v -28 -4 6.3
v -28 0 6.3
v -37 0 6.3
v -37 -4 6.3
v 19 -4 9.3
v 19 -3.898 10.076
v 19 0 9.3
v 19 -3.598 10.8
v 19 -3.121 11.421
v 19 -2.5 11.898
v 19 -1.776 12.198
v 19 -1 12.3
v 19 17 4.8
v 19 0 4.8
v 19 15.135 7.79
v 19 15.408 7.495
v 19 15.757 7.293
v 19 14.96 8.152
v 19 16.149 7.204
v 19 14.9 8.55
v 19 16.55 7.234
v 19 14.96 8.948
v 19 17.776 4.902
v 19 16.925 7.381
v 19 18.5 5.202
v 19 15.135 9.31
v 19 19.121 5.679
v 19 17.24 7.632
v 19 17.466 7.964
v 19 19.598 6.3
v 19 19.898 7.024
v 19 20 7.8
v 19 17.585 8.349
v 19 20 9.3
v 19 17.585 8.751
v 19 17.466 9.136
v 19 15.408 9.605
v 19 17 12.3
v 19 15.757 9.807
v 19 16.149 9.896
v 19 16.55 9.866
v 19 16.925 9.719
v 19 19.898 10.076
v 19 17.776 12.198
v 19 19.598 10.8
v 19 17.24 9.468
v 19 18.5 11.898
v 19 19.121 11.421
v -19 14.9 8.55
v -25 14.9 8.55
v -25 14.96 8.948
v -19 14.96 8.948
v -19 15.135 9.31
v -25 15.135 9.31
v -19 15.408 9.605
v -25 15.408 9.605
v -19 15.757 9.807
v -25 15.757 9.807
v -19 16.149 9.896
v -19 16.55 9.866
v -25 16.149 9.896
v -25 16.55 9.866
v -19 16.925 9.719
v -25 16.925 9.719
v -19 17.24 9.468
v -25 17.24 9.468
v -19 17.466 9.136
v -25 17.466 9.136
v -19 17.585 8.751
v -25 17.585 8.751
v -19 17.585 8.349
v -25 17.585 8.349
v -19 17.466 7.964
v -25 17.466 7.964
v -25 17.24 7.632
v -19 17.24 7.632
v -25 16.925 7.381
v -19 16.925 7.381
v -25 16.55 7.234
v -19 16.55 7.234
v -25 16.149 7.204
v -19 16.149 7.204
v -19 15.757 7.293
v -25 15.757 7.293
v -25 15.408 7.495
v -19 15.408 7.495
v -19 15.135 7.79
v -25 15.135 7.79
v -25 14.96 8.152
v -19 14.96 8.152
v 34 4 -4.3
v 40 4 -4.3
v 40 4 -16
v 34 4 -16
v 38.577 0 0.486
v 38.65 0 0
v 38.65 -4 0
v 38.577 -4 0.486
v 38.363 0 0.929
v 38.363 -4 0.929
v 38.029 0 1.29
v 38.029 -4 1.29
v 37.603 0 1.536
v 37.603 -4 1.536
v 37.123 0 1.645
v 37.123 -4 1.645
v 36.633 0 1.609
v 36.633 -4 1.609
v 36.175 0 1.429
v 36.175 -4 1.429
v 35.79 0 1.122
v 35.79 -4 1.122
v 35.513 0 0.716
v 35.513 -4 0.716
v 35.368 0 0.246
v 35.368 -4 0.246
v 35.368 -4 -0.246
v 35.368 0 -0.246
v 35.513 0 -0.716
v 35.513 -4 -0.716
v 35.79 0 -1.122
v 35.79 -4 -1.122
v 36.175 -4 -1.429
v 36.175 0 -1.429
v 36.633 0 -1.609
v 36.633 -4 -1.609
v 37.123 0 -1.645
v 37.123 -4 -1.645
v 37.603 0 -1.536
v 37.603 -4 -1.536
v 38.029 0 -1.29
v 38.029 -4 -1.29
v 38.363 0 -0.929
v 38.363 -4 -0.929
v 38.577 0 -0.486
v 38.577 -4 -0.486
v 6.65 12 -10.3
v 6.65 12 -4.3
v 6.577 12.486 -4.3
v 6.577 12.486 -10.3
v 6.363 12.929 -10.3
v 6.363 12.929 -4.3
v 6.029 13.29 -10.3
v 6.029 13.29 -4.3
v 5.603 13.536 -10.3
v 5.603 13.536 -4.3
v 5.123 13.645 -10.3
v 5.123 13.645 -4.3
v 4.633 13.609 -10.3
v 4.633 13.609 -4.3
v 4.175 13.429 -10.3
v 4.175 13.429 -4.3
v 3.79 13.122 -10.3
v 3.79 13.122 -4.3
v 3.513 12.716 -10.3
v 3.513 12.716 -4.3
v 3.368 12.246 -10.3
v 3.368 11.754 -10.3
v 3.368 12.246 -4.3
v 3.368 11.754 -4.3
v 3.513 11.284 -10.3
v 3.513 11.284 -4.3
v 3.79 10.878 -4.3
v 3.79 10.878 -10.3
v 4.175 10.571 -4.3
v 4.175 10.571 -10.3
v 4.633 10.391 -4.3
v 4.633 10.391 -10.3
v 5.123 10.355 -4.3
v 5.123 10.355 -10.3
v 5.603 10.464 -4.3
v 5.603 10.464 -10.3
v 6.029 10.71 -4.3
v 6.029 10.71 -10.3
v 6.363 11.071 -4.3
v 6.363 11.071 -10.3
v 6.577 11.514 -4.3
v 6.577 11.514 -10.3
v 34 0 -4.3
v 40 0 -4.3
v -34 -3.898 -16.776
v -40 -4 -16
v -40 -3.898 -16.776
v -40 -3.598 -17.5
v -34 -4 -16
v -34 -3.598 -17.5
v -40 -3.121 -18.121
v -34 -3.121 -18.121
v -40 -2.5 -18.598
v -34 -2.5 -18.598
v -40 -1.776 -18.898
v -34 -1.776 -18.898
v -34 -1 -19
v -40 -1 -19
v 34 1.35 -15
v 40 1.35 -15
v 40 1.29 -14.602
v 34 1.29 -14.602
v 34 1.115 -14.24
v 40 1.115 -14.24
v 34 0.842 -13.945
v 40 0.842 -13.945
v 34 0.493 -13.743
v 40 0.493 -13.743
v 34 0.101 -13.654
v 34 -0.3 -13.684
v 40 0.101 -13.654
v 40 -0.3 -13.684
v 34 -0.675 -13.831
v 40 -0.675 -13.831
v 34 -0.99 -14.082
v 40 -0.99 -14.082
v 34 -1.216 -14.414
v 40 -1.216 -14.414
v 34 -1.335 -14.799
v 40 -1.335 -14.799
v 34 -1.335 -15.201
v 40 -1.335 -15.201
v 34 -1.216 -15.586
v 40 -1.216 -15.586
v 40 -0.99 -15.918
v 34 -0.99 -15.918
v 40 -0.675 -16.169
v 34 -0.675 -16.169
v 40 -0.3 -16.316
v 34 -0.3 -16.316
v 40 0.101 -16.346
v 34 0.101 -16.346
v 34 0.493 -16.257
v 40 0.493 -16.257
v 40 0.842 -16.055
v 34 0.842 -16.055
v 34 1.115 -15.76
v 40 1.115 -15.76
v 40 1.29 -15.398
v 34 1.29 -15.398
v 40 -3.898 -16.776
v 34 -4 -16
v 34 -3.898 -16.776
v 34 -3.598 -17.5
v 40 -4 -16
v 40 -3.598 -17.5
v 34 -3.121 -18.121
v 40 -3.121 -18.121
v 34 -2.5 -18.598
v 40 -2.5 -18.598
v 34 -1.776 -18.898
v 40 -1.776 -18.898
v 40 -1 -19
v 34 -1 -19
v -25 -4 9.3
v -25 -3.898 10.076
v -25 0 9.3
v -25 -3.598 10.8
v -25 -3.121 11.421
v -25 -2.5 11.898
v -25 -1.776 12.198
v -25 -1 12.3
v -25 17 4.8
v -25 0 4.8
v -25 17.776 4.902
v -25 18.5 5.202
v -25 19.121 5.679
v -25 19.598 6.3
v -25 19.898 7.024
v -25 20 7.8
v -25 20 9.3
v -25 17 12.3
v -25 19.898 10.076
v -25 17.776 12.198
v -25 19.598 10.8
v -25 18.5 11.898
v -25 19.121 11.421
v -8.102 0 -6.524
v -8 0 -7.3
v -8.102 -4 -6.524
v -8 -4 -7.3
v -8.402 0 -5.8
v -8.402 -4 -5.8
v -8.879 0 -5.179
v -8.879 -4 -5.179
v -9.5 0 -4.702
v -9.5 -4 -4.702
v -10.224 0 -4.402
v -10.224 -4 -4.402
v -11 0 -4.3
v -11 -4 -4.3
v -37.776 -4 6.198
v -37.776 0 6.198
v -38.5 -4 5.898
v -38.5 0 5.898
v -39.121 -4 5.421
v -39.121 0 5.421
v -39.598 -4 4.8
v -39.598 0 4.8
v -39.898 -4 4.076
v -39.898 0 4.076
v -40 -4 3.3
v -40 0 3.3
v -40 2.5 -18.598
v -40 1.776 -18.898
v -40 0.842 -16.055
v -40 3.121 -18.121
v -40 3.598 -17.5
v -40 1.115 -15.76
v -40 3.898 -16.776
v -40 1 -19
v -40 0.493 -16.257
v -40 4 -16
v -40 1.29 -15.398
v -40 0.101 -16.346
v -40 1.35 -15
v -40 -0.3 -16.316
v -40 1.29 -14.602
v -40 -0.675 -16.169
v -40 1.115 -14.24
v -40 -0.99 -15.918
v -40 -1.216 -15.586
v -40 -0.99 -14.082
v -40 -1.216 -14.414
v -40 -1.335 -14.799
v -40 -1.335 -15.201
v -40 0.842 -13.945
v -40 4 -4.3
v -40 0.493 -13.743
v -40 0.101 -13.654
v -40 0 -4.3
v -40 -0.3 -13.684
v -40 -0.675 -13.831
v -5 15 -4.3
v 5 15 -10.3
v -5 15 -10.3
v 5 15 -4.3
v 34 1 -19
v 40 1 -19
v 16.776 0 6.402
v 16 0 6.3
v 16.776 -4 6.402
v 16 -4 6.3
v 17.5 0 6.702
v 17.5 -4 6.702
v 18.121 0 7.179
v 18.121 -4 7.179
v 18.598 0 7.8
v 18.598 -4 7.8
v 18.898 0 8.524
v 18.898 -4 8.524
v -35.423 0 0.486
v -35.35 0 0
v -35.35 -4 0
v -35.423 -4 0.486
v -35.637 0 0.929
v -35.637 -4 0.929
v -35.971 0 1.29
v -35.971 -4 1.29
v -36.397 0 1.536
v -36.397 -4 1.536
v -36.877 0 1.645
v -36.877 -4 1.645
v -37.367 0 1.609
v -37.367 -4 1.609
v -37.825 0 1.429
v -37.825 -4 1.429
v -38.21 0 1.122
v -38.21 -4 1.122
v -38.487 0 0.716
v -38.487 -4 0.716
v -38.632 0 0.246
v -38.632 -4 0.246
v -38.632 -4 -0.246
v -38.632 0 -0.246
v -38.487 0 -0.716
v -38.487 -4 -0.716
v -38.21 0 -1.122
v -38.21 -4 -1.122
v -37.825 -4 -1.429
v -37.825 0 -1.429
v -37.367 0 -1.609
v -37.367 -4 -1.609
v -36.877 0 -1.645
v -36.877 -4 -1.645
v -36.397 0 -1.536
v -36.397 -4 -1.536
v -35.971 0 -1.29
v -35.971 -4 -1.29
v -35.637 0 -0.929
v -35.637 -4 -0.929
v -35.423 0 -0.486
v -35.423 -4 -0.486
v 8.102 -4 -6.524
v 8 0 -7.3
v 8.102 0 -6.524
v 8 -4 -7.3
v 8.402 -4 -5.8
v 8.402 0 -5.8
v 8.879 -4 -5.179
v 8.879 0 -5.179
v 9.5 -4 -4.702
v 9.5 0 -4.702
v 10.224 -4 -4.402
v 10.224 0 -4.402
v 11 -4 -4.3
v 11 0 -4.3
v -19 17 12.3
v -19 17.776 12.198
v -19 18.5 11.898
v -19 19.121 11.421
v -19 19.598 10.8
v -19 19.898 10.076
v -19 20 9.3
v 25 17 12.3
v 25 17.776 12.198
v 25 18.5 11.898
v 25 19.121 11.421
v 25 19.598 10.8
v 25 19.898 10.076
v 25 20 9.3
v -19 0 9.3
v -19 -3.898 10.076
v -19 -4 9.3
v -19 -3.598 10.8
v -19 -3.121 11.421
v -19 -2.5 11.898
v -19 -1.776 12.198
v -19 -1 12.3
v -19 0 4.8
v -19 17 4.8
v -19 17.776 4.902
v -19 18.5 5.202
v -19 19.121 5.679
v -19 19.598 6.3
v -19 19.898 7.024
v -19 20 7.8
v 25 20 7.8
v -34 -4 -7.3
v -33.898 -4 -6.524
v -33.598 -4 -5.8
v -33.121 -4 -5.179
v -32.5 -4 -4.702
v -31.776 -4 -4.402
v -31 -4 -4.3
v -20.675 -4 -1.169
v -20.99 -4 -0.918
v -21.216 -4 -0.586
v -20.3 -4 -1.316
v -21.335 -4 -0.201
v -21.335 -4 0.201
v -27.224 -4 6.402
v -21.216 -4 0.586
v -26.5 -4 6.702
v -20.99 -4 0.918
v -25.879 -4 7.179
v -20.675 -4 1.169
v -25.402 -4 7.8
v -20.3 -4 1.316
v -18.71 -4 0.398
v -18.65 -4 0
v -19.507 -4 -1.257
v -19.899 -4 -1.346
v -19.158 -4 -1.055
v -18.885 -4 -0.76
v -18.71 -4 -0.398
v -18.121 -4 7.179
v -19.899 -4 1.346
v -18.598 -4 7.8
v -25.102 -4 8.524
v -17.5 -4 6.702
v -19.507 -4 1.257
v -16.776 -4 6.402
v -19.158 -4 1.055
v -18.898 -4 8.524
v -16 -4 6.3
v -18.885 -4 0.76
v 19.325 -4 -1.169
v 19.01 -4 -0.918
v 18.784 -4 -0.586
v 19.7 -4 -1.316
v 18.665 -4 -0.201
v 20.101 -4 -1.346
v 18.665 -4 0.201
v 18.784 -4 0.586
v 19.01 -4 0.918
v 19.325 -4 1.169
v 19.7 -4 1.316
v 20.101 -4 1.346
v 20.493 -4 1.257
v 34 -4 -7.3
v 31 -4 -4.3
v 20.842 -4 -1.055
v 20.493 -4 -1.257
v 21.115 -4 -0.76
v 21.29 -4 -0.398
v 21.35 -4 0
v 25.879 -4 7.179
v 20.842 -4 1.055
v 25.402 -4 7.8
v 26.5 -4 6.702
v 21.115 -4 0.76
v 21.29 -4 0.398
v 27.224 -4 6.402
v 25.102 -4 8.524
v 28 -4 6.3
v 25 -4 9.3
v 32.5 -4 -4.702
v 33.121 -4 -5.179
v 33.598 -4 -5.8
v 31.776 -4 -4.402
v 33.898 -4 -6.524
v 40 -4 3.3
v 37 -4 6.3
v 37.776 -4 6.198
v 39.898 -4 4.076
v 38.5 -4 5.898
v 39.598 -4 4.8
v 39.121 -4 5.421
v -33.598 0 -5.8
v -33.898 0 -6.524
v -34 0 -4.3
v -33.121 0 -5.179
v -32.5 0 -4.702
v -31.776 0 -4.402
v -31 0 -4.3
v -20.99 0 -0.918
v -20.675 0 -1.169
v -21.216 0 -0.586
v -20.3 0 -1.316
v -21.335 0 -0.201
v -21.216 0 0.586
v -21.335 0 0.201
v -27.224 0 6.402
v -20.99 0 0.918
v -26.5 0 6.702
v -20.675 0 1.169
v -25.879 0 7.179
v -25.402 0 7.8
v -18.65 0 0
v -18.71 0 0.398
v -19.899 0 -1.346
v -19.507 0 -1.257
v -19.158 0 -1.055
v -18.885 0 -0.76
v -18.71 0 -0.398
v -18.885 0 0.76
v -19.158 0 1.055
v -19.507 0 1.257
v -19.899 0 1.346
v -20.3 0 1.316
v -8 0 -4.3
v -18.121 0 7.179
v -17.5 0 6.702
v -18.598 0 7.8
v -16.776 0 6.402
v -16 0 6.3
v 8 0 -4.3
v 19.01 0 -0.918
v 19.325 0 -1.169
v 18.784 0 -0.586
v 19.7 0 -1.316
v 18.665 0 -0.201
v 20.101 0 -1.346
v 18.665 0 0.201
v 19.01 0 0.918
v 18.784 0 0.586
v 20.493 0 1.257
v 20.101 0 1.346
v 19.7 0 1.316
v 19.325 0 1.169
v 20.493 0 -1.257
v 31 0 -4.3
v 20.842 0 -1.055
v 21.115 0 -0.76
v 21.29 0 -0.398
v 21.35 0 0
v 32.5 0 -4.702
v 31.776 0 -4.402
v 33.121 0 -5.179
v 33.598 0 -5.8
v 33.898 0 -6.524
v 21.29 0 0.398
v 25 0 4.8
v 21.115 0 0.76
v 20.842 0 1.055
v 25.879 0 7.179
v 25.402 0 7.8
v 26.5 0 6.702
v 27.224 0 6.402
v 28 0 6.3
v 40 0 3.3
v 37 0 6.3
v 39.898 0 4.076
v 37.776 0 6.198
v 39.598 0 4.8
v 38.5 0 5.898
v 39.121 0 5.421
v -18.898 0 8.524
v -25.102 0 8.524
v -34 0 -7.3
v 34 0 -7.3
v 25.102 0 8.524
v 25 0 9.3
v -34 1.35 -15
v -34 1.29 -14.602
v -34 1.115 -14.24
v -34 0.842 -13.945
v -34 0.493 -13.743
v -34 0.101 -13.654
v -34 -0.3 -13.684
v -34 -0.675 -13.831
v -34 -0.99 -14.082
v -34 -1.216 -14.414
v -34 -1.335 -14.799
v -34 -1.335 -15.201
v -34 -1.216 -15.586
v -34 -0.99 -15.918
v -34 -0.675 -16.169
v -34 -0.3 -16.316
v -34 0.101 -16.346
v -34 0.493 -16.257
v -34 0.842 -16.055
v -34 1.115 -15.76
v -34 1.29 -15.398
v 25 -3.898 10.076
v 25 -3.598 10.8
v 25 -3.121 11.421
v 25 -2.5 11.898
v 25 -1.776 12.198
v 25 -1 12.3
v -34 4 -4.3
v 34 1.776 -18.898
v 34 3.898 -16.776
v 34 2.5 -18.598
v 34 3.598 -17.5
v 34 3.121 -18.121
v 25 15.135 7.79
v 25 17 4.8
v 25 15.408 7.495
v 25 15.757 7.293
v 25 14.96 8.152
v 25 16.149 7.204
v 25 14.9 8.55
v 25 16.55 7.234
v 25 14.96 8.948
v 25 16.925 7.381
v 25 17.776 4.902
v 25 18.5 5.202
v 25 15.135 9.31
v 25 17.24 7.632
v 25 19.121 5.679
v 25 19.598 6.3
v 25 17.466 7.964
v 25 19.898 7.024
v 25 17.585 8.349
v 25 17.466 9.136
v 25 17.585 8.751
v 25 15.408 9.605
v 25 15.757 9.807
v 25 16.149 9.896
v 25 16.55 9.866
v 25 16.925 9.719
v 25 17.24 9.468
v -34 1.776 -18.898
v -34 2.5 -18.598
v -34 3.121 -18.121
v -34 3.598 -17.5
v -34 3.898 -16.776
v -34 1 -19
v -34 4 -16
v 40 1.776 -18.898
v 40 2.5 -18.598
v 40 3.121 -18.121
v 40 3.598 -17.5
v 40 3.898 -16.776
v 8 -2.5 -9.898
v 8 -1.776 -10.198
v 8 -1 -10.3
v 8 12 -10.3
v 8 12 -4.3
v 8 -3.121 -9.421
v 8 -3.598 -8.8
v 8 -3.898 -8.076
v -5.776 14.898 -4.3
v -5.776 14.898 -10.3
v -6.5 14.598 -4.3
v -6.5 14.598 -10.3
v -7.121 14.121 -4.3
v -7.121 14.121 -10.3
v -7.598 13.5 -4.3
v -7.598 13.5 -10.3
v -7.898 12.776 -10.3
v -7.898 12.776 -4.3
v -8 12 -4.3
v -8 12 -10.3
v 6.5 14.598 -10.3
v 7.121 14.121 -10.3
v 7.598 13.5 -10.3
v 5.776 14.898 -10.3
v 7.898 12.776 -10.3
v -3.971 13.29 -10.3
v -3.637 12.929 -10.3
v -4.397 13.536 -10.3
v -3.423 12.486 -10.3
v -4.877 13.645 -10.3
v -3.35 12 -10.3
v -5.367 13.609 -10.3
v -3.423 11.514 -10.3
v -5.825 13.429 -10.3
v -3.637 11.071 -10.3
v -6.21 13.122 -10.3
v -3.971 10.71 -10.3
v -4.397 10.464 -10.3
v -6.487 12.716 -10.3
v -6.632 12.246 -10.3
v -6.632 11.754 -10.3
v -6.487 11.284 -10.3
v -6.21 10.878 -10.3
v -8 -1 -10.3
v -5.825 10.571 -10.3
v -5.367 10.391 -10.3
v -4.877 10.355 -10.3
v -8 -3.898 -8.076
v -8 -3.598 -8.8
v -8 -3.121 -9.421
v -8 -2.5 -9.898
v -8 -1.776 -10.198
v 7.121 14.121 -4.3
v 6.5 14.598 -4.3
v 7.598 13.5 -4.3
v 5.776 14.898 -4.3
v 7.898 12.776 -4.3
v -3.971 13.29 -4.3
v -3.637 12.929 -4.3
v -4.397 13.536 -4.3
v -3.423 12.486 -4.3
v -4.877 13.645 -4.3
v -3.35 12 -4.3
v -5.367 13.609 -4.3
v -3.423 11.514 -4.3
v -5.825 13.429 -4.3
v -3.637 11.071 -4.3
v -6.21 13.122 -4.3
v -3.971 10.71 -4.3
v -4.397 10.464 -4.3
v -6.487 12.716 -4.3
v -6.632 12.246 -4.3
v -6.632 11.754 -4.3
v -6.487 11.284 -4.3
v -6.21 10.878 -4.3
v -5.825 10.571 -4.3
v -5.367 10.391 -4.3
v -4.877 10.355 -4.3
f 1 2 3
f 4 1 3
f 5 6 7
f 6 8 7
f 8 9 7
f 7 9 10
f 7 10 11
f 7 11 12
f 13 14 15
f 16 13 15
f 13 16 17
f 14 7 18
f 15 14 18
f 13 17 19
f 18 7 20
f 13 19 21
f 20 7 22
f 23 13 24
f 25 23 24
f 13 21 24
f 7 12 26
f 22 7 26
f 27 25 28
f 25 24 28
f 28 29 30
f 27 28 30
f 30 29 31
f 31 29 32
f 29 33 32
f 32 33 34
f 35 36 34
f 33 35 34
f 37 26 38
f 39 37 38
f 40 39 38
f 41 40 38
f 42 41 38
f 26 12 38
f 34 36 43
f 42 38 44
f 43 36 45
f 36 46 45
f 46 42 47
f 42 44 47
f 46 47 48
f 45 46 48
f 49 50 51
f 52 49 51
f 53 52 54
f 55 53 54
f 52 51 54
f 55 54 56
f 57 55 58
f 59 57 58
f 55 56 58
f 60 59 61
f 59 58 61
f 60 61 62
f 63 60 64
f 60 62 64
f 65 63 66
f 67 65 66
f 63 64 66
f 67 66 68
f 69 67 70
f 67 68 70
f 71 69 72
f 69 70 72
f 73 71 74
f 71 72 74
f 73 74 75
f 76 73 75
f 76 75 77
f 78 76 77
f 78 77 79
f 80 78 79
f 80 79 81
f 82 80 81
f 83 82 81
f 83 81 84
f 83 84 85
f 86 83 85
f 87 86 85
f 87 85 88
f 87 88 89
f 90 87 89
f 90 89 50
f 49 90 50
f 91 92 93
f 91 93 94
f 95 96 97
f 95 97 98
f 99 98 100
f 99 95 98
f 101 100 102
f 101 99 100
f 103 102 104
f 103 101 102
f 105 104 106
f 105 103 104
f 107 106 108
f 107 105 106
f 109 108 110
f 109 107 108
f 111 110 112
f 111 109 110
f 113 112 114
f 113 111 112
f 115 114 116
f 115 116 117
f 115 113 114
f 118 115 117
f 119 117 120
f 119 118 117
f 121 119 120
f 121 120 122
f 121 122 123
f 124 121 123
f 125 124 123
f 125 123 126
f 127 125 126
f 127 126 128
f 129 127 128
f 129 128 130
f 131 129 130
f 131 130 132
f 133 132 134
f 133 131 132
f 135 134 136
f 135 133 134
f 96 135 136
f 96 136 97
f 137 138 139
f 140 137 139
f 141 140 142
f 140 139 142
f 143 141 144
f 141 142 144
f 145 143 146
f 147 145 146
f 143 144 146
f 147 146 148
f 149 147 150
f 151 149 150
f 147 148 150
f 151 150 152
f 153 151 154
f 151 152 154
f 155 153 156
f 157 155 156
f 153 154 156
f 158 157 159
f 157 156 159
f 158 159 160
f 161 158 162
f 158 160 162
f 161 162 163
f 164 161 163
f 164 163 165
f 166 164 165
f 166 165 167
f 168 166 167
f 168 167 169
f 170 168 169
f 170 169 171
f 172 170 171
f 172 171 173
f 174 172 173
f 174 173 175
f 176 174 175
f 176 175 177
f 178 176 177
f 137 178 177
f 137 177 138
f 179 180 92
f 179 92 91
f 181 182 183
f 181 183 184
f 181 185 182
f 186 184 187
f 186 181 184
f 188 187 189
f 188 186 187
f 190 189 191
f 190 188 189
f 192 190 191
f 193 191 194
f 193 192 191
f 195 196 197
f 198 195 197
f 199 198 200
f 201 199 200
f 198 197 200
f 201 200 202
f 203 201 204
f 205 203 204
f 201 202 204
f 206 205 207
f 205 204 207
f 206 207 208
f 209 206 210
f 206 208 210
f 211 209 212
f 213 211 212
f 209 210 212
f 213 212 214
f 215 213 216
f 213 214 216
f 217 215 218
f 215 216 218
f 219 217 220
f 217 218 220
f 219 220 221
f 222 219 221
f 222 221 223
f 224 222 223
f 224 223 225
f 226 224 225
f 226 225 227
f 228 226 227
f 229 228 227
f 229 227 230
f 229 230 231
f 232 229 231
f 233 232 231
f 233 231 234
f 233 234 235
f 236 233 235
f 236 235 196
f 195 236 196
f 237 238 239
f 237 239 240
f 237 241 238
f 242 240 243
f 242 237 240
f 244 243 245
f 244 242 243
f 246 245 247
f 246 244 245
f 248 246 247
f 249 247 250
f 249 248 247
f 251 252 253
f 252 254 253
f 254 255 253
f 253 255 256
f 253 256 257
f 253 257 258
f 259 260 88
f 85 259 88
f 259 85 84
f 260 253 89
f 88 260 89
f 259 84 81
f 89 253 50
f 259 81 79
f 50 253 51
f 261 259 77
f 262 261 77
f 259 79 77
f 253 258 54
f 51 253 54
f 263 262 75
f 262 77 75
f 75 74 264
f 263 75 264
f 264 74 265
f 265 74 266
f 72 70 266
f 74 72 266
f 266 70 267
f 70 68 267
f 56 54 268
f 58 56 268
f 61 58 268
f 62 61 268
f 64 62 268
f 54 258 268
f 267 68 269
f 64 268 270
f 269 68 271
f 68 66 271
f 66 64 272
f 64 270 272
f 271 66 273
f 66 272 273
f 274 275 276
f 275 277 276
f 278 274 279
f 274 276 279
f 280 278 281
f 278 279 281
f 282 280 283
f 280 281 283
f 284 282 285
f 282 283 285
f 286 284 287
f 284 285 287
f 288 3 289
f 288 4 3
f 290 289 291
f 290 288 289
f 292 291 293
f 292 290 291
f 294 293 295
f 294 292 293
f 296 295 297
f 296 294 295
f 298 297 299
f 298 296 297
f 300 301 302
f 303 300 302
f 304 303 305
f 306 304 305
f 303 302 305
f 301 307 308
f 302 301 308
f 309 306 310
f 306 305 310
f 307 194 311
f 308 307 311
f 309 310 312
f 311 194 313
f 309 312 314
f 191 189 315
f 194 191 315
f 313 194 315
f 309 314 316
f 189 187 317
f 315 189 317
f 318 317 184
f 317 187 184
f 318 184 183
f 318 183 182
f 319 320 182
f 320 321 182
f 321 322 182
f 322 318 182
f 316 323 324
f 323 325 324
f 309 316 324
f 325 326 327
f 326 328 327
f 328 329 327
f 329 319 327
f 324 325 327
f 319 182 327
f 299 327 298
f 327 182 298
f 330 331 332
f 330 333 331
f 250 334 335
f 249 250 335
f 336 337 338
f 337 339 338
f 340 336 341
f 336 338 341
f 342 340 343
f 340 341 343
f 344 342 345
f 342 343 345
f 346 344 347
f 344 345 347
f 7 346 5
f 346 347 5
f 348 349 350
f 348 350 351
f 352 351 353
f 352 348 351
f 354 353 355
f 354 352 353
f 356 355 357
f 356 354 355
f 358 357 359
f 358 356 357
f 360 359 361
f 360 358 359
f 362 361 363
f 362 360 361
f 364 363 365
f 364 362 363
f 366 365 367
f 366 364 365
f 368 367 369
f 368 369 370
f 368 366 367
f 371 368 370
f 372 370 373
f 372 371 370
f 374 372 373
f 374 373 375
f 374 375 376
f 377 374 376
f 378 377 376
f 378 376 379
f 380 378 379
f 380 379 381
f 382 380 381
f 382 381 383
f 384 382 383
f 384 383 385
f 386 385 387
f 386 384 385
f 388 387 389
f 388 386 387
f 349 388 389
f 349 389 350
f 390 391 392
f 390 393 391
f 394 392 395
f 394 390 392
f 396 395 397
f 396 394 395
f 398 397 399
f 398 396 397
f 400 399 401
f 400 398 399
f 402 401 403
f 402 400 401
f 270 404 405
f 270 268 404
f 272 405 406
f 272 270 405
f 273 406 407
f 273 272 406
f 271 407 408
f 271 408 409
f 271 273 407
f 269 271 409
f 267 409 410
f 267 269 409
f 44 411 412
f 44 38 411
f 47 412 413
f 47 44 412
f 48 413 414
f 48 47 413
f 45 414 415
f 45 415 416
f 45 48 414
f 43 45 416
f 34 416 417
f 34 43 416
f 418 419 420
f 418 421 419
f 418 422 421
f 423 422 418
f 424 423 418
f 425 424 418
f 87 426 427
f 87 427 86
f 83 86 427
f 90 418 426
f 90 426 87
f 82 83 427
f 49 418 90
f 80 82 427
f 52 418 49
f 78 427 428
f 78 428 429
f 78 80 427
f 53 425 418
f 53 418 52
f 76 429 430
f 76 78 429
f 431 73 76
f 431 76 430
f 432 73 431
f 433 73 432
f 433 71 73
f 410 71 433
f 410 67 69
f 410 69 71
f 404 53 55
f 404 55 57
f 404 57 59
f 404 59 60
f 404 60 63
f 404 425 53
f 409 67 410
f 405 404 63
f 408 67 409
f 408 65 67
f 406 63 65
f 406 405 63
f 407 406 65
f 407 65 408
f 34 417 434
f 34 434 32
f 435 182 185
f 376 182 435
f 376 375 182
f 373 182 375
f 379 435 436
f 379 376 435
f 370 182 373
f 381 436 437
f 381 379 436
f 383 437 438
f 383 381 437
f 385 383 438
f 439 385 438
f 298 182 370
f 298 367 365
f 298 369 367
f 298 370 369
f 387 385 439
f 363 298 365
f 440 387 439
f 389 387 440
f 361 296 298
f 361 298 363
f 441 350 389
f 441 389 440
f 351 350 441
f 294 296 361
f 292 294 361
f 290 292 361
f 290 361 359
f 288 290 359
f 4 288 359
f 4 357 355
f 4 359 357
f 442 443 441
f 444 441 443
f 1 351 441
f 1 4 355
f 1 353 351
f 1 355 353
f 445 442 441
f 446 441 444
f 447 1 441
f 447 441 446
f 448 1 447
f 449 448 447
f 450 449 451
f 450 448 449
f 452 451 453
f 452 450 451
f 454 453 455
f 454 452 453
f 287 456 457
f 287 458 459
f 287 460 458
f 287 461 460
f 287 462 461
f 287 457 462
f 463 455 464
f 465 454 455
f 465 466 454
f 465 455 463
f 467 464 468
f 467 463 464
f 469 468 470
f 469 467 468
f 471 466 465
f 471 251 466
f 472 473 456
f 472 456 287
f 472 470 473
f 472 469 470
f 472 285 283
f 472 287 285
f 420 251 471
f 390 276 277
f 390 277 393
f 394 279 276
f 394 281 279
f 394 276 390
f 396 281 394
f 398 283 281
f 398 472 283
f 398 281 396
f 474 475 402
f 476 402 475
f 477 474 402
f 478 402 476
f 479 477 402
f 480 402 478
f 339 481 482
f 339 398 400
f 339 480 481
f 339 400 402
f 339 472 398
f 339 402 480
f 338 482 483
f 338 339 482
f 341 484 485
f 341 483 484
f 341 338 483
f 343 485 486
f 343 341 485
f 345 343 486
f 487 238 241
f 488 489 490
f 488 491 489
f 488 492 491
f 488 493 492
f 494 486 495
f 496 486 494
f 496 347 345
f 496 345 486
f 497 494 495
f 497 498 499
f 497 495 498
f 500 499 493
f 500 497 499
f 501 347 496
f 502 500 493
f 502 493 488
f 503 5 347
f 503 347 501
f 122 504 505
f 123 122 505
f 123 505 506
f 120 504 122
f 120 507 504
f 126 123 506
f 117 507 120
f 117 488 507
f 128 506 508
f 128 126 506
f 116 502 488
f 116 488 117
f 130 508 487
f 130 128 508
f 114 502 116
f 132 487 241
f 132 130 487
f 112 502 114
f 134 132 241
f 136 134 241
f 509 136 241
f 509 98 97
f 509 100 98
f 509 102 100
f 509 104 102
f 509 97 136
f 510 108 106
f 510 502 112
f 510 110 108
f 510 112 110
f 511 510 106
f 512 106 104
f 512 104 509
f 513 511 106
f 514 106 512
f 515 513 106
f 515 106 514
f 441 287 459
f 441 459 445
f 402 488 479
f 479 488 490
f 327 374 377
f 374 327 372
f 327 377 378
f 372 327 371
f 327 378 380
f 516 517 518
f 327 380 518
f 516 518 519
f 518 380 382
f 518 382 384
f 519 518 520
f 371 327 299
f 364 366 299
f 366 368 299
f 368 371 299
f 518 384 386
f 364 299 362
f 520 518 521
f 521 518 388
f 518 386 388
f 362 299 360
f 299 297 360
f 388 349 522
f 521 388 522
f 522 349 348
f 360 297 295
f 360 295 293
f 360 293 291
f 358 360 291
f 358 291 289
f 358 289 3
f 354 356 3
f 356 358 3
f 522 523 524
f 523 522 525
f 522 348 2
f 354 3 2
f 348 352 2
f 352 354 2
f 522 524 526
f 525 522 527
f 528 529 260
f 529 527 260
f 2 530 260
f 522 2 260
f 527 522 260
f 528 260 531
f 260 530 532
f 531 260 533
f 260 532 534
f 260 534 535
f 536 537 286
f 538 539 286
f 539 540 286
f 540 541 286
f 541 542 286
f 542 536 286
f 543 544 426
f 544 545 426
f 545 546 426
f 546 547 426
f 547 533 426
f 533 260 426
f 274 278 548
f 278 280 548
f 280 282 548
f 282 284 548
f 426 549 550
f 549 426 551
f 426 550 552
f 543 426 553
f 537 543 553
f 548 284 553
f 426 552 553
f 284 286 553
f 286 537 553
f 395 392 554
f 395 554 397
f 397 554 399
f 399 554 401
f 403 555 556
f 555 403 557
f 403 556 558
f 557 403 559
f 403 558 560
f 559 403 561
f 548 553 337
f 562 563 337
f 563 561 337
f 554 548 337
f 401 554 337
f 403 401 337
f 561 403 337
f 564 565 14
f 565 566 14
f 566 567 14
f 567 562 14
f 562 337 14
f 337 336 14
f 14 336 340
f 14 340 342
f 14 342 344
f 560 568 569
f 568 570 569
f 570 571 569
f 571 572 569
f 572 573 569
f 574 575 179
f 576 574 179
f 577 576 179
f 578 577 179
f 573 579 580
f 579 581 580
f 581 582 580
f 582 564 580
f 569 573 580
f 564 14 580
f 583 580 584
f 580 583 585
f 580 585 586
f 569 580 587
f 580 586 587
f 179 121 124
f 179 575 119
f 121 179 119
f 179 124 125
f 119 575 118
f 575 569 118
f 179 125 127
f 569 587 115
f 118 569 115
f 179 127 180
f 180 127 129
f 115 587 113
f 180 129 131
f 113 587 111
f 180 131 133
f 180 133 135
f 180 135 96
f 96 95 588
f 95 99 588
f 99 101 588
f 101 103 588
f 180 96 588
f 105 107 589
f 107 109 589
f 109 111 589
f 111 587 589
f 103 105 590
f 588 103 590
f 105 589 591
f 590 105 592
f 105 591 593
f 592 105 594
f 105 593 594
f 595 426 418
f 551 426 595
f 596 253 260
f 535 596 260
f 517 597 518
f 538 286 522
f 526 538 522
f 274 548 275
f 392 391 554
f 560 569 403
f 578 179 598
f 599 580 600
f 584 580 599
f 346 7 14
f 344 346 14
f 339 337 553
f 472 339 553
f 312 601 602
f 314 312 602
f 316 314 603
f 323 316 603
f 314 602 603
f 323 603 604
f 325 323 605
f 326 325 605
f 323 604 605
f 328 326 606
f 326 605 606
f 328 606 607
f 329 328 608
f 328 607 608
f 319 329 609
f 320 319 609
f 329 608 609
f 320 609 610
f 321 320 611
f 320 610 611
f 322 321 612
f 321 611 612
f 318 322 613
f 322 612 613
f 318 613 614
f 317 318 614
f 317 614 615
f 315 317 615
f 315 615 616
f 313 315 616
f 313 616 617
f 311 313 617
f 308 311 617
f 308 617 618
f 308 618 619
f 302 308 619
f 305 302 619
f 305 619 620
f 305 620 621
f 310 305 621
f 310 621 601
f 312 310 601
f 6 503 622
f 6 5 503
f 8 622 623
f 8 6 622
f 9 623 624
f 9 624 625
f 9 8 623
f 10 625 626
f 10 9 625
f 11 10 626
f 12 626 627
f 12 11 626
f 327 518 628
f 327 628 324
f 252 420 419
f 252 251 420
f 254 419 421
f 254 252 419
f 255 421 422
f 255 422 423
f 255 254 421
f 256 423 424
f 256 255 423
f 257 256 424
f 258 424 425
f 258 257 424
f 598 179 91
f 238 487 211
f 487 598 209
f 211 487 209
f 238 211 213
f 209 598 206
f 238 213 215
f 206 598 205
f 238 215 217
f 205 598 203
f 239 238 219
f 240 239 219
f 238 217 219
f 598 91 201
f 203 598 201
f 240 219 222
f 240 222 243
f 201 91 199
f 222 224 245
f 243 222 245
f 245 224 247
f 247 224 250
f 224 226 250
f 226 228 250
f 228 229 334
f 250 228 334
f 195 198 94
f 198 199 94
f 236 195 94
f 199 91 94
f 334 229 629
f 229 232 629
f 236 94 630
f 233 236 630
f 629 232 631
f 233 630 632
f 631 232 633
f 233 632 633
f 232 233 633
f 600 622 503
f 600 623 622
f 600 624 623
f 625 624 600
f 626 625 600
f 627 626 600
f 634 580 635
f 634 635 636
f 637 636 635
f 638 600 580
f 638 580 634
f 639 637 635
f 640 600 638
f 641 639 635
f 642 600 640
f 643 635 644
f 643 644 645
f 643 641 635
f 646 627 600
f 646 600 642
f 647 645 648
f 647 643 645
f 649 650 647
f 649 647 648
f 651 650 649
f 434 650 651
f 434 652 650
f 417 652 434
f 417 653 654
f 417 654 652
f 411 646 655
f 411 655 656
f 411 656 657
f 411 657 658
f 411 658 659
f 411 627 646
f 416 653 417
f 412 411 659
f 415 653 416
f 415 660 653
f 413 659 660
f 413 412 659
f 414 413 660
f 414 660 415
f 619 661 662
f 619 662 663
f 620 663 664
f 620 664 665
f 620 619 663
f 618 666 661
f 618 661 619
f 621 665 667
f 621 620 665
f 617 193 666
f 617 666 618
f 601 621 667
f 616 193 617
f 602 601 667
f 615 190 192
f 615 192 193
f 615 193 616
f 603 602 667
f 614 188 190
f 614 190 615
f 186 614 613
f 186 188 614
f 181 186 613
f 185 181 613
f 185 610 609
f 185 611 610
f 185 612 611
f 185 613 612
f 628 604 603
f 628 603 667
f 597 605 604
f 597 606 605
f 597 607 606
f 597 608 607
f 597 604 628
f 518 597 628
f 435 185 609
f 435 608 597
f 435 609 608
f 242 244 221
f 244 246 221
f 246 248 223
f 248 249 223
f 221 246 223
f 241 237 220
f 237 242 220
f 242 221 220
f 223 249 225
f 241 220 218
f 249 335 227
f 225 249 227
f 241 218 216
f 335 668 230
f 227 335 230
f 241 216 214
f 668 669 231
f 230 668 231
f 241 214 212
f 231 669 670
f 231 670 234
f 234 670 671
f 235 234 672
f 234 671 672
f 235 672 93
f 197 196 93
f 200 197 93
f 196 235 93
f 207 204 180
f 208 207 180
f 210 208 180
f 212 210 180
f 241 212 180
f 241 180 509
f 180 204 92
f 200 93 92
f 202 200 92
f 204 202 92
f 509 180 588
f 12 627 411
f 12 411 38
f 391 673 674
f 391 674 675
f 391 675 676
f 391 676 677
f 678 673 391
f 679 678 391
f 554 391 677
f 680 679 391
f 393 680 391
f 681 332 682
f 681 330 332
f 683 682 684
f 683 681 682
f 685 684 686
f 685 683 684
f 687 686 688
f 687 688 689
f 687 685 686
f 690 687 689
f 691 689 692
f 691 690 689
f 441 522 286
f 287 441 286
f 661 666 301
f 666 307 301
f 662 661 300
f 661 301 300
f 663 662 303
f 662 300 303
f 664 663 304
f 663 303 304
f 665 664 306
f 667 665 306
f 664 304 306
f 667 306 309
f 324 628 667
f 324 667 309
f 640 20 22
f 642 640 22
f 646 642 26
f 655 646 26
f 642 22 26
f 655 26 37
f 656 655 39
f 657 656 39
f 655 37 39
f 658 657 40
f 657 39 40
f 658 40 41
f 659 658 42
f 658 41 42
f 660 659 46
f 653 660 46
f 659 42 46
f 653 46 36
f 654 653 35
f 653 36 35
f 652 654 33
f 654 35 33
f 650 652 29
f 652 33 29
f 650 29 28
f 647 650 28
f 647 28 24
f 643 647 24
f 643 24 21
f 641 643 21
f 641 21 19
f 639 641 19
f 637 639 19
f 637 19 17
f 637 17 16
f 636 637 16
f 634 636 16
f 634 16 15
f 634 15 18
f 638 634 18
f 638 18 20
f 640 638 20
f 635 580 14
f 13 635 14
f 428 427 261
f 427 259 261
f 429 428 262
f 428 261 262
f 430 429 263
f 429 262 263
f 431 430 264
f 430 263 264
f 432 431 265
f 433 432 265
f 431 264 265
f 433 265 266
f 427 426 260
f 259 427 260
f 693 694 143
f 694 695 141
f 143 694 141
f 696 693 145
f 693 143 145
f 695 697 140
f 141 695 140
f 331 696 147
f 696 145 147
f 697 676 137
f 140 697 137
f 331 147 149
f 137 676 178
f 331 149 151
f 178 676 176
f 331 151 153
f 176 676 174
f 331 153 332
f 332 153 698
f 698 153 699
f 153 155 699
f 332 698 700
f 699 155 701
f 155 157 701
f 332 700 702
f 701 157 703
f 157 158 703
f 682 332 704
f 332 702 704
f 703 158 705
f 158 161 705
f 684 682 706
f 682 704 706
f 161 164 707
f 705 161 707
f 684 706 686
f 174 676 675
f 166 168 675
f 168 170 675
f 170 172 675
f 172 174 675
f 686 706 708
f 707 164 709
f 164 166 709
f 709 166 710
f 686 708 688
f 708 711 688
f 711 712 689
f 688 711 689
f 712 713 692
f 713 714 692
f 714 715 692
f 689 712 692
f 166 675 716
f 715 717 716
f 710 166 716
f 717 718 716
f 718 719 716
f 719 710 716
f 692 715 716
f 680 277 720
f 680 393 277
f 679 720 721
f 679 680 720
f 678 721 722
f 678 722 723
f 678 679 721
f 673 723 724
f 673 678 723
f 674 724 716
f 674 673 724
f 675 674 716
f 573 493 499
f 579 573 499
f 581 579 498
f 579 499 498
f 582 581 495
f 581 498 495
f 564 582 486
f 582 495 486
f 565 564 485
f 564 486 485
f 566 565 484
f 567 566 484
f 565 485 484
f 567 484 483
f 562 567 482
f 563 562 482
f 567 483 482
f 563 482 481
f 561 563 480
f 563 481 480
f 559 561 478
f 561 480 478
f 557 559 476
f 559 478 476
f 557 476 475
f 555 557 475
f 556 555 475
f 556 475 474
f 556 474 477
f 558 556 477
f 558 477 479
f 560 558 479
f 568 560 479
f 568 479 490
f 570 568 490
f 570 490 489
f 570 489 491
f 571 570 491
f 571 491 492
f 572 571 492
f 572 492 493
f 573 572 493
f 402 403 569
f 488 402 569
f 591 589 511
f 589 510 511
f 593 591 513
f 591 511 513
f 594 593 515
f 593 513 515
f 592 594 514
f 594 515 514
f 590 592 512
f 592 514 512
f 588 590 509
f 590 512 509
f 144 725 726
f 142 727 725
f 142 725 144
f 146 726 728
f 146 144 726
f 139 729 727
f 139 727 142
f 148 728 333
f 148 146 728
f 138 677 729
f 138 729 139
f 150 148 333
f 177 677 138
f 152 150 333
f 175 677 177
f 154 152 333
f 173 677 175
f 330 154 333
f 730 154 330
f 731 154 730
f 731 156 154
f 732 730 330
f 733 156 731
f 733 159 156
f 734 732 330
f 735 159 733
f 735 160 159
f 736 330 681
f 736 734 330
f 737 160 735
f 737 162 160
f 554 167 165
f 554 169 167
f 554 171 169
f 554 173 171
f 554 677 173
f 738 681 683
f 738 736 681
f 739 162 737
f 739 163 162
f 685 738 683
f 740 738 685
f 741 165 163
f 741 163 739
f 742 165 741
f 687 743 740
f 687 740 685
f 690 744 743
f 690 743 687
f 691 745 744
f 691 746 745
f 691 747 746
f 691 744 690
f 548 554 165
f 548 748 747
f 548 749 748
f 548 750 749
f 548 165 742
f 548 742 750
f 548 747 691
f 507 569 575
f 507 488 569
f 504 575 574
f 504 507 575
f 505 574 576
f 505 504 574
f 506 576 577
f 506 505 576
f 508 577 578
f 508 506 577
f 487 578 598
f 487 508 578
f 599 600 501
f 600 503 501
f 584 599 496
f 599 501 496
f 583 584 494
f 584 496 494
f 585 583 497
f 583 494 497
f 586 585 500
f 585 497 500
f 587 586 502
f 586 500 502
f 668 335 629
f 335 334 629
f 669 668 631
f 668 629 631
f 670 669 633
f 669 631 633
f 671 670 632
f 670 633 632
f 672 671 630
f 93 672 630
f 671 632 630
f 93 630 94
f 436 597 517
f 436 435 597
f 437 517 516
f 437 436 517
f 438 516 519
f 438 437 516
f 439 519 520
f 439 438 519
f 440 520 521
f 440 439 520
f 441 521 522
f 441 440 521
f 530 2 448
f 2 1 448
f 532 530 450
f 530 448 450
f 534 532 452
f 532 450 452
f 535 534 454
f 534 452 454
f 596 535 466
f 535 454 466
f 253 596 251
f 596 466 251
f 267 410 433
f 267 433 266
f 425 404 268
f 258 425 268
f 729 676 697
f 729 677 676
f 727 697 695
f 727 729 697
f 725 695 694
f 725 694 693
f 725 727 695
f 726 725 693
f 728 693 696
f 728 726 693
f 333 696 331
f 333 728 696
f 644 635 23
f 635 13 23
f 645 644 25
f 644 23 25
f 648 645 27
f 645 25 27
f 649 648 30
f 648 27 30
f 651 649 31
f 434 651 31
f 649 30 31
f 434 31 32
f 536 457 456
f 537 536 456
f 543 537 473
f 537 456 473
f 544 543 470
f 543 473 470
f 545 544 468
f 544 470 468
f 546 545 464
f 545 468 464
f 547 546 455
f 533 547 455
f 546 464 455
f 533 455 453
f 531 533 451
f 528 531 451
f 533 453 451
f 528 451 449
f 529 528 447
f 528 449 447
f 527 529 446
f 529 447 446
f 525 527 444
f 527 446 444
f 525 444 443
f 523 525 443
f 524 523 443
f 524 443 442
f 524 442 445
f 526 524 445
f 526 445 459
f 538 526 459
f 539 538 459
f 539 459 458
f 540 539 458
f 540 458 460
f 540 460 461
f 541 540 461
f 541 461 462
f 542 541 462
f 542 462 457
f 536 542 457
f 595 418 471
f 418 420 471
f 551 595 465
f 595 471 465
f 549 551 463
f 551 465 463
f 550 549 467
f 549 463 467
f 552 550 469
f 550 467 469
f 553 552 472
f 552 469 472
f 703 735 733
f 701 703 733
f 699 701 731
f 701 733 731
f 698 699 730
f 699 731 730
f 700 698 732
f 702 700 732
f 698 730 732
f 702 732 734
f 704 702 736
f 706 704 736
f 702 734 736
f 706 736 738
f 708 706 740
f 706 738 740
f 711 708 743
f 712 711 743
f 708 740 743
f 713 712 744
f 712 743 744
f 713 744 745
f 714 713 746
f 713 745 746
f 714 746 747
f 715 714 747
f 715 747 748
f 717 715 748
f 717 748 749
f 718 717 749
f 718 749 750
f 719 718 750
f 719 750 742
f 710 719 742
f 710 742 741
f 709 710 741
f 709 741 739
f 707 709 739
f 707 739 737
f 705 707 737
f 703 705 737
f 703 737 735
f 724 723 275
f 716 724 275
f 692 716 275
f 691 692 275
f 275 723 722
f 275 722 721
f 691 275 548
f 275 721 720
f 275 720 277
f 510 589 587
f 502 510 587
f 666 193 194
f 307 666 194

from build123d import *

# Parameters (mm, degrees)
F0_R      = 1.65
F1_DEPTH  = 4
F2_W      = 6
F2_H      = 14.7
F2_W_2    = 16
F2_H_2    = 6
F3_DEPTH  = 4
F4_W      = 6
F4_H      = 6
F5_DEPTH  = 20
F6_DEPTH  = 1.5
F7_DEPTH  = 11
F8_R      = 1.65
F9_DEPTH  = 14.701
F10_R     = 1.35
F11_DEPTH = 80.001
F12_R     = 1.35
F13_DEPTH = 65.001
F14_R     = 2.99999
F15_R     = 1.35
F16_DEPTH = 24.001


# Not quite as in the source:
# - a fillet or chamfer is up to 0.001 mm smaller than in the source, because OpenCascade refuses the exact size


with BuildPart() as f1:
    # F0 (on Front) → F1 (new body)
    with BuildSketch(Plane.XZ):
        Polygon((-25, 6.3), (-40, 6.3), (-40, -4.3), (-40, -19), (-34, -19), (-34, -4.3), (-8, -4.3), (-8, -10.3), (8, -10.3), (8, -4.3), (34, -4.3), (34, -19), (40, -19), (40, -4.3), (40, 6.3), (25, 6.3), (25, 12.3), (19, 12.3), (19, 6.3), (-19, 6.3), (-19, 12.3), (-25, 12.3), align=None)
        with Locations((-37, 0)):
            Circle(F0_R, mode=Mode.SUBTRACT)
        with Locations((37, 0)):
            Circle(F0_R, mode=Mode.SUBTRACT)
    extrude(amount=F1_DEPTH)

    # F2 (on face) → F3 (join)
    with BuildSketch(Plane(origin=(0, 0, 0), x_dir=(-1, 0, 0), z_dir=(0, 1, 0))):
        with Locations((37, -11.65)):
            Rectangle(F2_W, F2_H)
        with Locations((0, -7.3)):
            Rectangle(F2_W_2, F2_H_2)
        with Locations((-37, -11.65)):
            Rectangle(F2_W, F2_H)
    extrude(amount=F3_DEPTH)

    # F4 (on face) → F5 (join)
    with BuildSketch(Plane(origin=(0, 0, 0), x_dir=(-1, 0, 0), z_dir=(0, 1, 0))):
        with Locations((-22, 9.3)):
            Rectangle(F4_W, F4_H)
        with Locations((22, 9.3)):
            Rectangle(F4_W, F4_H)
    extrude(amount=F5_DEPTH)

    # F6 (add): faces of the model
    f6_faces = [f1.faces().sort_by_distance(p)[0] for p in [
        (22, 10, 6.3),
        (-22, 10, 6.3),
    ]]
    extrude(f6_faces, amount=F6_DEPTH)

    # F7 (add): a face of the model
    f7_faces = [f1.faces().sort_by_distance(p)[0] for p in [
        (0, 4, -7.3),
    ]]
    extrude(f7_faces, amount=F7_DEPTH)

    # F8 (on face) → F9 (cut, through all)
    with BuildSketch(Plane.XY.offset(-4.3)):
        with Locations((5, 12)):
            Circle(F8_R)
        with Locations((-5, 12)):
            Circle(F8_R)
    extrude(amount=-F9_DEPTH, mode=Mode.SUBTRACT)

    # F10 (on face) → F11 (cut, through all)
    with BuildSketch(Plane.YZ.offset(40)):
        with Locations((0, -15)):
            Circle(F10_R)
    extrude(amount=-F11_DEPTH, mode=Mode.SUBTRACT)

    # F12 (on face) → F13 (cut, through all)
    with BuildSketch(Plane(origin=(-25, 0, 0), x_dir=(0, -1, 0), z_dir=(-1, 0, 0))):
        with Locations((-16.25, 8.55)):
            Circle(F12_R)
    extrude(amount=-F13_DEPTH, mode=Mode.SUBTRACT)

    # F14 (radius 3 in the source; OpenCascade refuses exactly that, so slightly less here)
    f14_edges = [f1.edges().sort_by_distance(p)[0] for p in [
        (-37, -4, -19),
        (37, -4, -19),
        (37, 4, -19),
        (-37, 4, -19),
        (8, 15, -7.3),
        (-8, 15, -7.3),
        (-22, 20, 12.3),
        (22, 20, 12.3),
        (-22, 20, 4.8),
        (22, 20, 4.8),
        (-22, -4, 12.3),
        (22, -4, 12.3),
        (-34, -2, -4.3),
        (34, -2, -4.3),
        (-8, -2, -4.3),
        (8, -2, -4.3),
        (-25, -2, 6.3),
        (19, -2, 6.3),
        (-19, -2, 6.3),
        (25, -2, 6.3),
        (-40, -2, 6.3),
        (40, -2, 6.3),
        (0, -4, -10.3),
    ]]
    fillet(f14_edges, radius=F14_R)

    # F15 (on face) → F16 (cut, through all)
    with BuildSketch(Plane.XZ.offset(4)):
        with Locations((-20, 0)):
            Circle(F15_R)
        with Locations((20, 0)):
            Circle(F15_R)
    extrude(amount=-F16_DEPTH, mode=Mode.SUBTRACT)


solid = f1.part
